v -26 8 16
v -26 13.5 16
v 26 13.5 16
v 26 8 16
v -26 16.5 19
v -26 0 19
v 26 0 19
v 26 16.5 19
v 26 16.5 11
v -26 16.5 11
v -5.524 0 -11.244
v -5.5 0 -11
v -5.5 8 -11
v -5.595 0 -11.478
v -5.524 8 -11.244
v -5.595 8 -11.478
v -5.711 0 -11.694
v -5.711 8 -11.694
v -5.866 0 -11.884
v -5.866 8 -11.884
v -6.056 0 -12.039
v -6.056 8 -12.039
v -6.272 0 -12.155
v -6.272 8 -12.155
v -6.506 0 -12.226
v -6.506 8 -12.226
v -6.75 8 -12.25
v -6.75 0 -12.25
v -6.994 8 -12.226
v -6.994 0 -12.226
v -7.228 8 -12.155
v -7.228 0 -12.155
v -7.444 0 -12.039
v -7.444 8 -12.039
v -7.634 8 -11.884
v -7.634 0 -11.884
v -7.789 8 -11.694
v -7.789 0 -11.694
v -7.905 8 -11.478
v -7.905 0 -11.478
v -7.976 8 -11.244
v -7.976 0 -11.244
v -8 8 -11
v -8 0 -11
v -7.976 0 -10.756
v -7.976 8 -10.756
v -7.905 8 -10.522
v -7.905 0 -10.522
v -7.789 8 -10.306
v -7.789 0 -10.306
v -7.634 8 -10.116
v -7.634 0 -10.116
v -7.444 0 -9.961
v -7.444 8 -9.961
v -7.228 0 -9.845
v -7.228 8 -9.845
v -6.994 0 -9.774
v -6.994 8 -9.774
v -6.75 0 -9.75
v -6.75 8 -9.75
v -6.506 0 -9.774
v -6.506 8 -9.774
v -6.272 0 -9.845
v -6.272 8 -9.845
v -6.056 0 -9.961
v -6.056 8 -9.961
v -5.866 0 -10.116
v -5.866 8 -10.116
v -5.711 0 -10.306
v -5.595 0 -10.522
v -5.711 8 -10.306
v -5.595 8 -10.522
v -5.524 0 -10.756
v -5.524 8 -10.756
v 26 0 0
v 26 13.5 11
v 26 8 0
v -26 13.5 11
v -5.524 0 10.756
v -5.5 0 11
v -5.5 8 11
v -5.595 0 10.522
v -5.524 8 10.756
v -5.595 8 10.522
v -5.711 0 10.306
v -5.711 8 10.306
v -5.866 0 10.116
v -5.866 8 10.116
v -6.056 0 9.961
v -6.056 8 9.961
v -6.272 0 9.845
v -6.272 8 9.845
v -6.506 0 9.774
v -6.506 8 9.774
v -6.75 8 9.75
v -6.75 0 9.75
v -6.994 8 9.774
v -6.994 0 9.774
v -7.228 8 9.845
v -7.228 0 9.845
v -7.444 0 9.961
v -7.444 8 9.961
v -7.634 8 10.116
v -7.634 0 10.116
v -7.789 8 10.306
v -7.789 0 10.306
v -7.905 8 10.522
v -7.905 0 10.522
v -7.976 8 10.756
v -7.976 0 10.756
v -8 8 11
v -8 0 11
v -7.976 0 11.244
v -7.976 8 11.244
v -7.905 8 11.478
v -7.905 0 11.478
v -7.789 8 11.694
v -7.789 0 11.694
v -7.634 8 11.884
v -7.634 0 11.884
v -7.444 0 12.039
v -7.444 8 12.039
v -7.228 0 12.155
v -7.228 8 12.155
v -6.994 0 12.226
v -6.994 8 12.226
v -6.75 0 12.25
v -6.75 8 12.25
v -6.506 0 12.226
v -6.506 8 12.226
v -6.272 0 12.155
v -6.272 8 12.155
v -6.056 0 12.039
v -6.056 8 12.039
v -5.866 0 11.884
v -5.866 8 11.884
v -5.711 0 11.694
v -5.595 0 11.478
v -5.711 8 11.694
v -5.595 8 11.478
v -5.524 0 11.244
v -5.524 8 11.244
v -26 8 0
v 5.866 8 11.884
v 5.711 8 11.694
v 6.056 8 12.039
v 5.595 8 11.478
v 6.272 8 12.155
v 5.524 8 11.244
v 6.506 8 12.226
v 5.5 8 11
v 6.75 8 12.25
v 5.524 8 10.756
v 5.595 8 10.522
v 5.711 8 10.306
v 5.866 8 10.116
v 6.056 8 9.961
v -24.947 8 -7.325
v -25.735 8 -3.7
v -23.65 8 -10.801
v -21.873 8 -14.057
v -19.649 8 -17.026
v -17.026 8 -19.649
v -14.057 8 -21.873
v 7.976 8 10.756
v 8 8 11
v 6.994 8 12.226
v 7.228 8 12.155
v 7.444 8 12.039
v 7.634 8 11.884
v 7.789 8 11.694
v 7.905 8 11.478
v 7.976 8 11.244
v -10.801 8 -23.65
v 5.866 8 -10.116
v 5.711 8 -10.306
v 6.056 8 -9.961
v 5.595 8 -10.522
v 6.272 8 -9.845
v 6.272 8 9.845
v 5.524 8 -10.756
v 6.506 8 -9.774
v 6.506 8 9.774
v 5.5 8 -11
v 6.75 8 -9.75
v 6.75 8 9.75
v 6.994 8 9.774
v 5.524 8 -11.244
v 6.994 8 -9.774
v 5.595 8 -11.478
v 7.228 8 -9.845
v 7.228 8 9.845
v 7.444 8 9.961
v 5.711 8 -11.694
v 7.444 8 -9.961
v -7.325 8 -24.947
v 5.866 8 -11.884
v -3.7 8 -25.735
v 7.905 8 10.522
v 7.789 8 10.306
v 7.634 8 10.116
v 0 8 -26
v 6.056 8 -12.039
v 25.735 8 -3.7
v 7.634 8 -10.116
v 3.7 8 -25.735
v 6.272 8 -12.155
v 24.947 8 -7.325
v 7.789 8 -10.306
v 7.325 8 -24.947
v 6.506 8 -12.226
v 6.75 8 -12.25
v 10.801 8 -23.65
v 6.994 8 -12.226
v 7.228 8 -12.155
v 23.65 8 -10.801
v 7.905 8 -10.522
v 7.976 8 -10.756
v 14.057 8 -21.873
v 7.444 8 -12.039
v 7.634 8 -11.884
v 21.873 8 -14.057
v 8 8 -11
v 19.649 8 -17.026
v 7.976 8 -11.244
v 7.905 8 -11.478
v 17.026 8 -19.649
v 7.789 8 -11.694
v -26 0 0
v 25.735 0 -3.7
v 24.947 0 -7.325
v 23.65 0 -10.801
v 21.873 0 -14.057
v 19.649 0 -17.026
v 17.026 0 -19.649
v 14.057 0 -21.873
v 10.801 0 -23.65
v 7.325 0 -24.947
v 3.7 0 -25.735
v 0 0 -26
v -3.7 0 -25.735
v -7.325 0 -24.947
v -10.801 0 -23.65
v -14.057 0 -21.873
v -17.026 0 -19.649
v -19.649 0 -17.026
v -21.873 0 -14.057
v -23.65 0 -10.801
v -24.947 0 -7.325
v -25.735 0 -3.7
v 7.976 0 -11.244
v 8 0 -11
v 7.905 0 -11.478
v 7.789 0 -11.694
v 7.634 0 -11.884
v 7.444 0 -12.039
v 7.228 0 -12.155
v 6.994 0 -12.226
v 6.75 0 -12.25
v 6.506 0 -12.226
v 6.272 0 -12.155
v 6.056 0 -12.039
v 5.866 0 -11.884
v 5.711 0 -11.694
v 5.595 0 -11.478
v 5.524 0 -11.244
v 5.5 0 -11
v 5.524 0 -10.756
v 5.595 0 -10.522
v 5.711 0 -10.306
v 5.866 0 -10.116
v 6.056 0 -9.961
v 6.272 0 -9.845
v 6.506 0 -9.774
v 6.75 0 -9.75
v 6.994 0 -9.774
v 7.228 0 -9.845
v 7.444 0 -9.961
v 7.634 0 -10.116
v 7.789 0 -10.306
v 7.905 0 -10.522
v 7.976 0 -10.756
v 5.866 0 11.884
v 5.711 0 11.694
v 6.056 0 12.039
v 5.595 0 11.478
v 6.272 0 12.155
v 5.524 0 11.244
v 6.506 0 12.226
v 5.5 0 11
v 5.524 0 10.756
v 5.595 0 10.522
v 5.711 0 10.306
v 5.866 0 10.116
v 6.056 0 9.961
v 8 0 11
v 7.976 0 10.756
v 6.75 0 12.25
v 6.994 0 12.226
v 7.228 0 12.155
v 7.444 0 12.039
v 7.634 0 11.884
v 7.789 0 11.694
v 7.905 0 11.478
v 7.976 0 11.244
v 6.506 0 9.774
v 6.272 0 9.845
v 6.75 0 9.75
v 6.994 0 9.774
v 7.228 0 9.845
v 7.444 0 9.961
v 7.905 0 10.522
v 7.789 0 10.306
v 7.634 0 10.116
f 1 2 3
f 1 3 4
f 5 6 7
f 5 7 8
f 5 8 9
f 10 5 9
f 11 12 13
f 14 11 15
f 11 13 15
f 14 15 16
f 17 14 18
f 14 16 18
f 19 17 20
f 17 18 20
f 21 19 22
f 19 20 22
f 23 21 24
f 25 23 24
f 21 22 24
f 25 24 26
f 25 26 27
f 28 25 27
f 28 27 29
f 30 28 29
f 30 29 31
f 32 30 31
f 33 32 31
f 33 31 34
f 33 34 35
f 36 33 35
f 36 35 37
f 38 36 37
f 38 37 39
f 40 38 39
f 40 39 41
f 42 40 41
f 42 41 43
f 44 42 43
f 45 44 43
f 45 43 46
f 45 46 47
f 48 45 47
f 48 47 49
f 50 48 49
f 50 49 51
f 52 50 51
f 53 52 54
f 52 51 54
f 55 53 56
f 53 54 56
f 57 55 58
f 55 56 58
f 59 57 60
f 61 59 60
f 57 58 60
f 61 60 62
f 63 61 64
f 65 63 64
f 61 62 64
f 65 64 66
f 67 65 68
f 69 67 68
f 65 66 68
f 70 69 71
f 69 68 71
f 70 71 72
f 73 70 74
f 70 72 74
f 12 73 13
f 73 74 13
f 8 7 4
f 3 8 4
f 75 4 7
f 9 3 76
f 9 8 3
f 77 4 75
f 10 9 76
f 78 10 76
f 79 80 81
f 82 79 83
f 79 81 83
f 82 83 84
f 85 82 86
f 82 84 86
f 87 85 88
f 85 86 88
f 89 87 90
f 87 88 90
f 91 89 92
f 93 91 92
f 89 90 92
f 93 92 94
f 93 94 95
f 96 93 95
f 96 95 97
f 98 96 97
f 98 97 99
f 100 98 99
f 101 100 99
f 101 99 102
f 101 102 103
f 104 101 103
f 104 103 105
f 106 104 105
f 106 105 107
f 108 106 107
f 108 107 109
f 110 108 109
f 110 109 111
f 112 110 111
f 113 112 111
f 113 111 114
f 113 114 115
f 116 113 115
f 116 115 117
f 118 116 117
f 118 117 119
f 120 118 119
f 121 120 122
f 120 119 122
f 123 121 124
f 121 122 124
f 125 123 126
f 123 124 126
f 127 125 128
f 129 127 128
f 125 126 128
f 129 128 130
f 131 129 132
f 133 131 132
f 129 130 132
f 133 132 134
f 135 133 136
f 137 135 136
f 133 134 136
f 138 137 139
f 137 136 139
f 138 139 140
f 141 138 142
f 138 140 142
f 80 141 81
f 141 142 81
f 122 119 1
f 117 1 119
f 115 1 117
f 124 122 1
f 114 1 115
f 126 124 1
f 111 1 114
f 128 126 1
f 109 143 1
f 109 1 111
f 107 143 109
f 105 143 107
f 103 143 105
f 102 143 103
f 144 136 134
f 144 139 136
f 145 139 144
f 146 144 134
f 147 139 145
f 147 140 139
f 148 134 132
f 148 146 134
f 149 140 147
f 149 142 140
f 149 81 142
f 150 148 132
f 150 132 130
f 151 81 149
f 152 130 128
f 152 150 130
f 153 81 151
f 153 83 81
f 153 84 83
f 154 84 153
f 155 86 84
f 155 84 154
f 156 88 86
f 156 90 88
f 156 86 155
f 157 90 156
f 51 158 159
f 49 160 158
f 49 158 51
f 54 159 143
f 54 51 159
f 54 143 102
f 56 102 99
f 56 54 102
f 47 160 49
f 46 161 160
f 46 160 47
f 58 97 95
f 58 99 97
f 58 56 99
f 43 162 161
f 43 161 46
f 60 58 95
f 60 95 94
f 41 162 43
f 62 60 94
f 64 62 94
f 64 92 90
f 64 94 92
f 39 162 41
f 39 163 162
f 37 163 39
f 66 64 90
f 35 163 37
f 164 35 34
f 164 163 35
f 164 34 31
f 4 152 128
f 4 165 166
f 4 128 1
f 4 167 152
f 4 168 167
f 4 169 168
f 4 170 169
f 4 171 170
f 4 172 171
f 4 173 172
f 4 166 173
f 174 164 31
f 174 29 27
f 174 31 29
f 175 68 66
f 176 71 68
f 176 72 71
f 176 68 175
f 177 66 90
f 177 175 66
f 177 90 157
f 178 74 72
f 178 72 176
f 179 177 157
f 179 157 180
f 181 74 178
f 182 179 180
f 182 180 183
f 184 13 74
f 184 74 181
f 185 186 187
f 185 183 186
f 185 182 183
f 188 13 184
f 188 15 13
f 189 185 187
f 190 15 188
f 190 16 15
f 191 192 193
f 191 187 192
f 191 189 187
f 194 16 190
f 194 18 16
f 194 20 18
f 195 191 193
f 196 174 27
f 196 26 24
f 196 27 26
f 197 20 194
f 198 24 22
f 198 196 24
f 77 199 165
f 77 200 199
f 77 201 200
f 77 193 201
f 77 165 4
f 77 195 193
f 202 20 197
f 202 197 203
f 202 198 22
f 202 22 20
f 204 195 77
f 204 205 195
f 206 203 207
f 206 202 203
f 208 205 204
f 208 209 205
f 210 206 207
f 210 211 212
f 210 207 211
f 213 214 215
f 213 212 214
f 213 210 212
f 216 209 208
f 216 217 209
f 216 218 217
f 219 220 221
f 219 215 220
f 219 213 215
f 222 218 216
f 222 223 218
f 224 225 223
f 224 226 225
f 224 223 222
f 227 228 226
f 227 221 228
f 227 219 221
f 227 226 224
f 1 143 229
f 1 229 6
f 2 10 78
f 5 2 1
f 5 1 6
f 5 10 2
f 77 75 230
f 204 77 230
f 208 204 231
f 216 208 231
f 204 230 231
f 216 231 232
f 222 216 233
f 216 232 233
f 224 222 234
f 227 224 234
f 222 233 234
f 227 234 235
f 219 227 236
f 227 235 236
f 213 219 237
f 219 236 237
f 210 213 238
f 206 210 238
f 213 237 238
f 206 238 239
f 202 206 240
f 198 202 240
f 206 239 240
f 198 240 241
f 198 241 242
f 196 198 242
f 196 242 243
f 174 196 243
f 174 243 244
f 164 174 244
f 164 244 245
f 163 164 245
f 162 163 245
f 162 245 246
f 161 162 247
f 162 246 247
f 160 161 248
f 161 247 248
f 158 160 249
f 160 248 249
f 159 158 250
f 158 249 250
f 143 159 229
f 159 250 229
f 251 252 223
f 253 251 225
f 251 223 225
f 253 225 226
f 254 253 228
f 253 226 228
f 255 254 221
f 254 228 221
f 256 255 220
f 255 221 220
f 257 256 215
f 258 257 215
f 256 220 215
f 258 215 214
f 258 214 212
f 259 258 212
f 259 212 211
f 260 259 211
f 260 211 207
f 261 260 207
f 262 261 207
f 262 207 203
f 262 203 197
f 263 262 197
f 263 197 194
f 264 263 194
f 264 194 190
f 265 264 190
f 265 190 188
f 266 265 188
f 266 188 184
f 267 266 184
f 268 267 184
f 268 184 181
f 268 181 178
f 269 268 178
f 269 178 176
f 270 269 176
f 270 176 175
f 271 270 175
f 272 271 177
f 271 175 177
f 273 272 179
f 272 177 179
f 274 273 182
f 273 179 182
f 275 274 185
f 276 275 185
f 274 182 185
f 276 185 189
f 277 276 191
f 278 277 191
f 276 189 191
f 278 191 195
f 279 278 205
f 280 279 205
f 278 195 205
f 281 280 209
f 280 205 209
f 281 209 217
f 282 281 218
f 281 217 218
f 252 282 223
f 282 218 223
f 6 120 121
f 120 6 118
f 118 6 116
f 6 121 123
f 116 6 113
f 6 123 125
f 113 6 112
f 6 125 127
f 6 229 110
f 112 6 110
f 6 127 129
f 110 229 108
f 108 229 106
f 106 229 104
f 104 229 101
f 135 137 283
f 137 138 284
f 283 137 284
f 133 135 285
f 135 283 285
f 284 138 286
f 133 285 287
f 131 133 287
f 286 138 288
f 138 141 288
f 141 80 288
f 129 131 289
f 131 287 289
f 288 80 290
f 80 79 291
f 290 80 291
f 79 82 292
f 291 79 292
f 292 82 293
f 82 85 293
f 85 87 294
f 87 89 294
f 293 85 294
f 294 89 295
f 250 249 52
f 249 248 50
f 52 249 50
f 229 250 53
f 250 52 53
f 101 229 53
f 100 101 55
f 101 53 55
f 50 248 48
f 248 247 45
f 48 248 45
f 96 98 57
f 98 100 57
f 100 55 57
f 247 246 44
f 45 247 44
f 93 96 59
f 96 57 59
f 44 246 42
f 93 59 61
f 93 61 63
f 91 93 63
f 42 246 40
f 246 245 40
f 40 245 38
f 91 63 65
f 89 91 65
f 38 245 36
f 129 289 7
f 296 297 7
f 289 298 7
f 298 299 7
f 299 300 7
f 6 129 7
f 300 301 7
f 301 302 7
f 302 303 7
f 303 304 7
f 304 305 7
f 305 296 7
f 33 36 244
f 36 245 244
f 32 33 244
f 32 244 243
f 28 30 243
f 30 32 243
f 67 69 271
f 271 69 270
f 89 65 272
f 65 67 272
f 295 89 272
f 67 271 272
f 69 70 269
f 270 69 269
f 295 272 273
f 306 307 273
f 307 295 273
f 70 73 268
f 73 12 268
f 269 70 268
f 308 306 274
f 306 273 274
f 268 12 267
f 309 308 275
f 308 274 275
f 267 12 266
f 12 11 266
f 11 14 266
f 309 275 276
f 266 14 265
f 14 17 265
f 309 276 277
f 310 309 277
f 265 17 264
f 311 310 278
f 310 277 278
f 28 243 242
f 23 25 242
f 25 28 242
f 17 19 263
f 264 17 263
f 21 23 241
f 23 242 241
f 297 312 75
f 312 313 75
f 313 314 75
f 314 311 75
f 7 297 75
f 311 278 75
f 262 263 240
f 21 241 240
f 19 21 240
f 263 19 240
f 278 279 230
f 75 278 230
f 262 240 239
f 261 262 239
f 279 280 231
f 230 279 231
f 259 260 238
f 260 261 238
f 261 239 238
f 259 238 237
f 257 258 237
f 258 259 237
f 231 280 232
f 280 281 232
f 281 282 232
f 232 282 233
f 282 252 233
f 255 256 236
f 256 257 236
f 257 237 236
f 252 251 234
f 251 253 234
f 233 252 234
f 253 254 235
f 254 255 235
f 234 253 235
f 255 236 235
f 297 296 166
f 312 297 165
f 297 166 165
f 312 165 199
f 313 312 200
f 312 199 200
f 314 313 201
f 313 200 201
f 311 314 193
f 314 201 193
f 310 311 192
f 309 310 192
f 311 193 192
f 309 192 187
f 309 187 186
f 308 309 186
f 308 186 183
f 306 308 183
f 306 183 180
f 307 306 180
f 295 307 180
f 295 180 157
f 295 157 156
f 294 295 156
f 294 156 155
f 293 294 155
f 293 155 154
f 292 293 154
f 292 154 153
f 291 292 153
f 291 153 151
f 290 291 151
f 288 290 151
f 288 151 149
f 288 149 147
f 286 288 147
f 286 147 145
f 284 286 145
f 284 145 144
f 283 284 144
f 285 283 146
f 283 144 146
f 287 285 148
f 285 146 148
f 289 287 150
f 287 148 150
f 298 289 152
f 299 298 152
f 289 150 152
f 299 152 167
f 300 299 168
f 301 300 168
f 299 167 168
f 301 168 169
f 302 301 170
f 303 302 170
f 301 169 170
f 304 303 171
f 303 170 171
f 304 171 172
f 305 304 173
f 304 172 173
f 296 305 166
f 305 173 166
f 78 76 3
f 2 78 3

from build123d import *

# Parameters (mm, degrees)
BOSS_EXTRUDE1_DEPTH             = 2
BOSS_EXTRUDE3_DEPTH             = 8
BOSS_EXTRUDE2_REACH             = 28
BOSS_EXTRUDE2_DIRECTION_2_REACH = 28
TAP_DRILL_FOR_M3X0_5_TAP1_D     = 2.5
TAP_DRILL_FOR_M3X0_5_TAP1_DEPTH = 8


with BuildPart() as part:
    # Sketch1 → Boss-Extrude1 (new body)
    with BuildSketch(Plane(origin=(0, 0, 0), x_dir=(1, 0, 0), z_dir=(0, 1, 0))):
        with BuildLine():
            Line((-26, 0), (-26, -19))
            Line((-26, -19), (26, -19))
            Line((26, -19), (26, 0))
            ThreePointArc((26, 0), (0, 26), (-26, 0))
        make_face()
    extrude(amount=BOSS_EXTRUDE1_DEPTH)

    # Sketch1<3> → Boss-Extrude3 (add)
    with BuildSketch(Plane(origin=(0, 0, 0), x_dir=(1, 0, 0), z_dir=(0, 1, 0))):
        with BuildLine():
            ThreePointArc((26, 0), (0, 26), (-26, 0))
            Line((-26, 0), (-26, -19))
            Line((-26, -19), (26, -19))
            Line((26, -19), (26, 0))
        make_face()
    extrude(amount=BOSS_EXTRUDE3_DEPTH)

    # Boss-Extrude2: up to this face of the body (flat: up to its plane)
    boss_extrude2_end = Plane(part.part.faces().sort_by_distance((26, 4, 9.5))[0])
    # Sketch3 → Boss-Extrude2 (add, up to the picked face)
    with BuildSketch(Plane(origin=(0, 0, 0), x_dir=(0, 0, -1), z_dir=(1, 0, 0)), mode=Mode.PRIVATE) as boss_extrude2_sk1:
        Polygon((-19, 8), (-19, 16.5), (-11, 16.5), (-11, 13.5), (-16, 13.5), (-16, 8), align=None)
    boss_extrude2_tool1 = split(extrude(boss_extrude2_sk1.sketch, amount=BOSS_EXTRUDE2_REACH, mode=Mode.PRIVATE), bisect_by=boss_extrude2_end, keep=Keep.BOTH, mode=Mode.PRIVATE)
    add(boss_extrude2_tool1.solids().sort_by_distance((0, 13.268519, 16.018519))[0])

    # Boss-Extrude2 direction 2: up to this face of the body (flat: up to its plane)
    boss_extrude2_direction_2_end = Plane(part.part.faces().sort_by_distance((-26, 4, 9.5))[0])
    # Sketch3 → Boss-Extrude2 direction 2 (add, up to the picked face)
    with BuildSketch(Plane(origin=(0, 0, 0), x_dir=(0, 0, -1), z_dir=(1, 0, 0)), mode=Mode.PRIVATE) as boss_extrude2_direction_2_sk1:
        Polygon((-19, 8), (-19, 16.5), (-11, 16.5), (-11, 13.5), (-16, 13.5), (-16, 8), align=None)
    boss_extrude2_direction_2_tool1 = split(extrude(boss_extrude2_direction_2_sk1.sketch, amount=-BOSS_EXTRUDE2_DIRECTION_2_REACH, mode=Mode.PRIVATE), bisect_by=boss_extrude2_direction_2_end, keep=Keep.BOTH, mode=Mode.PRIVATE)
    add(boss_extrude2_direction_2_tool1.solids().sort_by_distance((0, 13.268519, 16.018519))[0])

    # Tap Drill for M3x0.5 Tap1
    with Locations(Plane(origin=(0, 0, 0), x_dir=(-1, 0, 0), z_dir=(0, -1, 0))):
        with Locations((-6.75, 11), (6.75, 11), (6.75, -11), (-6.75, -11)):
            Hole(TAP_DRILL_FOR_M3X0_5_TAP1_D / 2, depth=TAP_DRILL_FOR_M3X0_5_TAP1_DEPTH)


solid = part.part
